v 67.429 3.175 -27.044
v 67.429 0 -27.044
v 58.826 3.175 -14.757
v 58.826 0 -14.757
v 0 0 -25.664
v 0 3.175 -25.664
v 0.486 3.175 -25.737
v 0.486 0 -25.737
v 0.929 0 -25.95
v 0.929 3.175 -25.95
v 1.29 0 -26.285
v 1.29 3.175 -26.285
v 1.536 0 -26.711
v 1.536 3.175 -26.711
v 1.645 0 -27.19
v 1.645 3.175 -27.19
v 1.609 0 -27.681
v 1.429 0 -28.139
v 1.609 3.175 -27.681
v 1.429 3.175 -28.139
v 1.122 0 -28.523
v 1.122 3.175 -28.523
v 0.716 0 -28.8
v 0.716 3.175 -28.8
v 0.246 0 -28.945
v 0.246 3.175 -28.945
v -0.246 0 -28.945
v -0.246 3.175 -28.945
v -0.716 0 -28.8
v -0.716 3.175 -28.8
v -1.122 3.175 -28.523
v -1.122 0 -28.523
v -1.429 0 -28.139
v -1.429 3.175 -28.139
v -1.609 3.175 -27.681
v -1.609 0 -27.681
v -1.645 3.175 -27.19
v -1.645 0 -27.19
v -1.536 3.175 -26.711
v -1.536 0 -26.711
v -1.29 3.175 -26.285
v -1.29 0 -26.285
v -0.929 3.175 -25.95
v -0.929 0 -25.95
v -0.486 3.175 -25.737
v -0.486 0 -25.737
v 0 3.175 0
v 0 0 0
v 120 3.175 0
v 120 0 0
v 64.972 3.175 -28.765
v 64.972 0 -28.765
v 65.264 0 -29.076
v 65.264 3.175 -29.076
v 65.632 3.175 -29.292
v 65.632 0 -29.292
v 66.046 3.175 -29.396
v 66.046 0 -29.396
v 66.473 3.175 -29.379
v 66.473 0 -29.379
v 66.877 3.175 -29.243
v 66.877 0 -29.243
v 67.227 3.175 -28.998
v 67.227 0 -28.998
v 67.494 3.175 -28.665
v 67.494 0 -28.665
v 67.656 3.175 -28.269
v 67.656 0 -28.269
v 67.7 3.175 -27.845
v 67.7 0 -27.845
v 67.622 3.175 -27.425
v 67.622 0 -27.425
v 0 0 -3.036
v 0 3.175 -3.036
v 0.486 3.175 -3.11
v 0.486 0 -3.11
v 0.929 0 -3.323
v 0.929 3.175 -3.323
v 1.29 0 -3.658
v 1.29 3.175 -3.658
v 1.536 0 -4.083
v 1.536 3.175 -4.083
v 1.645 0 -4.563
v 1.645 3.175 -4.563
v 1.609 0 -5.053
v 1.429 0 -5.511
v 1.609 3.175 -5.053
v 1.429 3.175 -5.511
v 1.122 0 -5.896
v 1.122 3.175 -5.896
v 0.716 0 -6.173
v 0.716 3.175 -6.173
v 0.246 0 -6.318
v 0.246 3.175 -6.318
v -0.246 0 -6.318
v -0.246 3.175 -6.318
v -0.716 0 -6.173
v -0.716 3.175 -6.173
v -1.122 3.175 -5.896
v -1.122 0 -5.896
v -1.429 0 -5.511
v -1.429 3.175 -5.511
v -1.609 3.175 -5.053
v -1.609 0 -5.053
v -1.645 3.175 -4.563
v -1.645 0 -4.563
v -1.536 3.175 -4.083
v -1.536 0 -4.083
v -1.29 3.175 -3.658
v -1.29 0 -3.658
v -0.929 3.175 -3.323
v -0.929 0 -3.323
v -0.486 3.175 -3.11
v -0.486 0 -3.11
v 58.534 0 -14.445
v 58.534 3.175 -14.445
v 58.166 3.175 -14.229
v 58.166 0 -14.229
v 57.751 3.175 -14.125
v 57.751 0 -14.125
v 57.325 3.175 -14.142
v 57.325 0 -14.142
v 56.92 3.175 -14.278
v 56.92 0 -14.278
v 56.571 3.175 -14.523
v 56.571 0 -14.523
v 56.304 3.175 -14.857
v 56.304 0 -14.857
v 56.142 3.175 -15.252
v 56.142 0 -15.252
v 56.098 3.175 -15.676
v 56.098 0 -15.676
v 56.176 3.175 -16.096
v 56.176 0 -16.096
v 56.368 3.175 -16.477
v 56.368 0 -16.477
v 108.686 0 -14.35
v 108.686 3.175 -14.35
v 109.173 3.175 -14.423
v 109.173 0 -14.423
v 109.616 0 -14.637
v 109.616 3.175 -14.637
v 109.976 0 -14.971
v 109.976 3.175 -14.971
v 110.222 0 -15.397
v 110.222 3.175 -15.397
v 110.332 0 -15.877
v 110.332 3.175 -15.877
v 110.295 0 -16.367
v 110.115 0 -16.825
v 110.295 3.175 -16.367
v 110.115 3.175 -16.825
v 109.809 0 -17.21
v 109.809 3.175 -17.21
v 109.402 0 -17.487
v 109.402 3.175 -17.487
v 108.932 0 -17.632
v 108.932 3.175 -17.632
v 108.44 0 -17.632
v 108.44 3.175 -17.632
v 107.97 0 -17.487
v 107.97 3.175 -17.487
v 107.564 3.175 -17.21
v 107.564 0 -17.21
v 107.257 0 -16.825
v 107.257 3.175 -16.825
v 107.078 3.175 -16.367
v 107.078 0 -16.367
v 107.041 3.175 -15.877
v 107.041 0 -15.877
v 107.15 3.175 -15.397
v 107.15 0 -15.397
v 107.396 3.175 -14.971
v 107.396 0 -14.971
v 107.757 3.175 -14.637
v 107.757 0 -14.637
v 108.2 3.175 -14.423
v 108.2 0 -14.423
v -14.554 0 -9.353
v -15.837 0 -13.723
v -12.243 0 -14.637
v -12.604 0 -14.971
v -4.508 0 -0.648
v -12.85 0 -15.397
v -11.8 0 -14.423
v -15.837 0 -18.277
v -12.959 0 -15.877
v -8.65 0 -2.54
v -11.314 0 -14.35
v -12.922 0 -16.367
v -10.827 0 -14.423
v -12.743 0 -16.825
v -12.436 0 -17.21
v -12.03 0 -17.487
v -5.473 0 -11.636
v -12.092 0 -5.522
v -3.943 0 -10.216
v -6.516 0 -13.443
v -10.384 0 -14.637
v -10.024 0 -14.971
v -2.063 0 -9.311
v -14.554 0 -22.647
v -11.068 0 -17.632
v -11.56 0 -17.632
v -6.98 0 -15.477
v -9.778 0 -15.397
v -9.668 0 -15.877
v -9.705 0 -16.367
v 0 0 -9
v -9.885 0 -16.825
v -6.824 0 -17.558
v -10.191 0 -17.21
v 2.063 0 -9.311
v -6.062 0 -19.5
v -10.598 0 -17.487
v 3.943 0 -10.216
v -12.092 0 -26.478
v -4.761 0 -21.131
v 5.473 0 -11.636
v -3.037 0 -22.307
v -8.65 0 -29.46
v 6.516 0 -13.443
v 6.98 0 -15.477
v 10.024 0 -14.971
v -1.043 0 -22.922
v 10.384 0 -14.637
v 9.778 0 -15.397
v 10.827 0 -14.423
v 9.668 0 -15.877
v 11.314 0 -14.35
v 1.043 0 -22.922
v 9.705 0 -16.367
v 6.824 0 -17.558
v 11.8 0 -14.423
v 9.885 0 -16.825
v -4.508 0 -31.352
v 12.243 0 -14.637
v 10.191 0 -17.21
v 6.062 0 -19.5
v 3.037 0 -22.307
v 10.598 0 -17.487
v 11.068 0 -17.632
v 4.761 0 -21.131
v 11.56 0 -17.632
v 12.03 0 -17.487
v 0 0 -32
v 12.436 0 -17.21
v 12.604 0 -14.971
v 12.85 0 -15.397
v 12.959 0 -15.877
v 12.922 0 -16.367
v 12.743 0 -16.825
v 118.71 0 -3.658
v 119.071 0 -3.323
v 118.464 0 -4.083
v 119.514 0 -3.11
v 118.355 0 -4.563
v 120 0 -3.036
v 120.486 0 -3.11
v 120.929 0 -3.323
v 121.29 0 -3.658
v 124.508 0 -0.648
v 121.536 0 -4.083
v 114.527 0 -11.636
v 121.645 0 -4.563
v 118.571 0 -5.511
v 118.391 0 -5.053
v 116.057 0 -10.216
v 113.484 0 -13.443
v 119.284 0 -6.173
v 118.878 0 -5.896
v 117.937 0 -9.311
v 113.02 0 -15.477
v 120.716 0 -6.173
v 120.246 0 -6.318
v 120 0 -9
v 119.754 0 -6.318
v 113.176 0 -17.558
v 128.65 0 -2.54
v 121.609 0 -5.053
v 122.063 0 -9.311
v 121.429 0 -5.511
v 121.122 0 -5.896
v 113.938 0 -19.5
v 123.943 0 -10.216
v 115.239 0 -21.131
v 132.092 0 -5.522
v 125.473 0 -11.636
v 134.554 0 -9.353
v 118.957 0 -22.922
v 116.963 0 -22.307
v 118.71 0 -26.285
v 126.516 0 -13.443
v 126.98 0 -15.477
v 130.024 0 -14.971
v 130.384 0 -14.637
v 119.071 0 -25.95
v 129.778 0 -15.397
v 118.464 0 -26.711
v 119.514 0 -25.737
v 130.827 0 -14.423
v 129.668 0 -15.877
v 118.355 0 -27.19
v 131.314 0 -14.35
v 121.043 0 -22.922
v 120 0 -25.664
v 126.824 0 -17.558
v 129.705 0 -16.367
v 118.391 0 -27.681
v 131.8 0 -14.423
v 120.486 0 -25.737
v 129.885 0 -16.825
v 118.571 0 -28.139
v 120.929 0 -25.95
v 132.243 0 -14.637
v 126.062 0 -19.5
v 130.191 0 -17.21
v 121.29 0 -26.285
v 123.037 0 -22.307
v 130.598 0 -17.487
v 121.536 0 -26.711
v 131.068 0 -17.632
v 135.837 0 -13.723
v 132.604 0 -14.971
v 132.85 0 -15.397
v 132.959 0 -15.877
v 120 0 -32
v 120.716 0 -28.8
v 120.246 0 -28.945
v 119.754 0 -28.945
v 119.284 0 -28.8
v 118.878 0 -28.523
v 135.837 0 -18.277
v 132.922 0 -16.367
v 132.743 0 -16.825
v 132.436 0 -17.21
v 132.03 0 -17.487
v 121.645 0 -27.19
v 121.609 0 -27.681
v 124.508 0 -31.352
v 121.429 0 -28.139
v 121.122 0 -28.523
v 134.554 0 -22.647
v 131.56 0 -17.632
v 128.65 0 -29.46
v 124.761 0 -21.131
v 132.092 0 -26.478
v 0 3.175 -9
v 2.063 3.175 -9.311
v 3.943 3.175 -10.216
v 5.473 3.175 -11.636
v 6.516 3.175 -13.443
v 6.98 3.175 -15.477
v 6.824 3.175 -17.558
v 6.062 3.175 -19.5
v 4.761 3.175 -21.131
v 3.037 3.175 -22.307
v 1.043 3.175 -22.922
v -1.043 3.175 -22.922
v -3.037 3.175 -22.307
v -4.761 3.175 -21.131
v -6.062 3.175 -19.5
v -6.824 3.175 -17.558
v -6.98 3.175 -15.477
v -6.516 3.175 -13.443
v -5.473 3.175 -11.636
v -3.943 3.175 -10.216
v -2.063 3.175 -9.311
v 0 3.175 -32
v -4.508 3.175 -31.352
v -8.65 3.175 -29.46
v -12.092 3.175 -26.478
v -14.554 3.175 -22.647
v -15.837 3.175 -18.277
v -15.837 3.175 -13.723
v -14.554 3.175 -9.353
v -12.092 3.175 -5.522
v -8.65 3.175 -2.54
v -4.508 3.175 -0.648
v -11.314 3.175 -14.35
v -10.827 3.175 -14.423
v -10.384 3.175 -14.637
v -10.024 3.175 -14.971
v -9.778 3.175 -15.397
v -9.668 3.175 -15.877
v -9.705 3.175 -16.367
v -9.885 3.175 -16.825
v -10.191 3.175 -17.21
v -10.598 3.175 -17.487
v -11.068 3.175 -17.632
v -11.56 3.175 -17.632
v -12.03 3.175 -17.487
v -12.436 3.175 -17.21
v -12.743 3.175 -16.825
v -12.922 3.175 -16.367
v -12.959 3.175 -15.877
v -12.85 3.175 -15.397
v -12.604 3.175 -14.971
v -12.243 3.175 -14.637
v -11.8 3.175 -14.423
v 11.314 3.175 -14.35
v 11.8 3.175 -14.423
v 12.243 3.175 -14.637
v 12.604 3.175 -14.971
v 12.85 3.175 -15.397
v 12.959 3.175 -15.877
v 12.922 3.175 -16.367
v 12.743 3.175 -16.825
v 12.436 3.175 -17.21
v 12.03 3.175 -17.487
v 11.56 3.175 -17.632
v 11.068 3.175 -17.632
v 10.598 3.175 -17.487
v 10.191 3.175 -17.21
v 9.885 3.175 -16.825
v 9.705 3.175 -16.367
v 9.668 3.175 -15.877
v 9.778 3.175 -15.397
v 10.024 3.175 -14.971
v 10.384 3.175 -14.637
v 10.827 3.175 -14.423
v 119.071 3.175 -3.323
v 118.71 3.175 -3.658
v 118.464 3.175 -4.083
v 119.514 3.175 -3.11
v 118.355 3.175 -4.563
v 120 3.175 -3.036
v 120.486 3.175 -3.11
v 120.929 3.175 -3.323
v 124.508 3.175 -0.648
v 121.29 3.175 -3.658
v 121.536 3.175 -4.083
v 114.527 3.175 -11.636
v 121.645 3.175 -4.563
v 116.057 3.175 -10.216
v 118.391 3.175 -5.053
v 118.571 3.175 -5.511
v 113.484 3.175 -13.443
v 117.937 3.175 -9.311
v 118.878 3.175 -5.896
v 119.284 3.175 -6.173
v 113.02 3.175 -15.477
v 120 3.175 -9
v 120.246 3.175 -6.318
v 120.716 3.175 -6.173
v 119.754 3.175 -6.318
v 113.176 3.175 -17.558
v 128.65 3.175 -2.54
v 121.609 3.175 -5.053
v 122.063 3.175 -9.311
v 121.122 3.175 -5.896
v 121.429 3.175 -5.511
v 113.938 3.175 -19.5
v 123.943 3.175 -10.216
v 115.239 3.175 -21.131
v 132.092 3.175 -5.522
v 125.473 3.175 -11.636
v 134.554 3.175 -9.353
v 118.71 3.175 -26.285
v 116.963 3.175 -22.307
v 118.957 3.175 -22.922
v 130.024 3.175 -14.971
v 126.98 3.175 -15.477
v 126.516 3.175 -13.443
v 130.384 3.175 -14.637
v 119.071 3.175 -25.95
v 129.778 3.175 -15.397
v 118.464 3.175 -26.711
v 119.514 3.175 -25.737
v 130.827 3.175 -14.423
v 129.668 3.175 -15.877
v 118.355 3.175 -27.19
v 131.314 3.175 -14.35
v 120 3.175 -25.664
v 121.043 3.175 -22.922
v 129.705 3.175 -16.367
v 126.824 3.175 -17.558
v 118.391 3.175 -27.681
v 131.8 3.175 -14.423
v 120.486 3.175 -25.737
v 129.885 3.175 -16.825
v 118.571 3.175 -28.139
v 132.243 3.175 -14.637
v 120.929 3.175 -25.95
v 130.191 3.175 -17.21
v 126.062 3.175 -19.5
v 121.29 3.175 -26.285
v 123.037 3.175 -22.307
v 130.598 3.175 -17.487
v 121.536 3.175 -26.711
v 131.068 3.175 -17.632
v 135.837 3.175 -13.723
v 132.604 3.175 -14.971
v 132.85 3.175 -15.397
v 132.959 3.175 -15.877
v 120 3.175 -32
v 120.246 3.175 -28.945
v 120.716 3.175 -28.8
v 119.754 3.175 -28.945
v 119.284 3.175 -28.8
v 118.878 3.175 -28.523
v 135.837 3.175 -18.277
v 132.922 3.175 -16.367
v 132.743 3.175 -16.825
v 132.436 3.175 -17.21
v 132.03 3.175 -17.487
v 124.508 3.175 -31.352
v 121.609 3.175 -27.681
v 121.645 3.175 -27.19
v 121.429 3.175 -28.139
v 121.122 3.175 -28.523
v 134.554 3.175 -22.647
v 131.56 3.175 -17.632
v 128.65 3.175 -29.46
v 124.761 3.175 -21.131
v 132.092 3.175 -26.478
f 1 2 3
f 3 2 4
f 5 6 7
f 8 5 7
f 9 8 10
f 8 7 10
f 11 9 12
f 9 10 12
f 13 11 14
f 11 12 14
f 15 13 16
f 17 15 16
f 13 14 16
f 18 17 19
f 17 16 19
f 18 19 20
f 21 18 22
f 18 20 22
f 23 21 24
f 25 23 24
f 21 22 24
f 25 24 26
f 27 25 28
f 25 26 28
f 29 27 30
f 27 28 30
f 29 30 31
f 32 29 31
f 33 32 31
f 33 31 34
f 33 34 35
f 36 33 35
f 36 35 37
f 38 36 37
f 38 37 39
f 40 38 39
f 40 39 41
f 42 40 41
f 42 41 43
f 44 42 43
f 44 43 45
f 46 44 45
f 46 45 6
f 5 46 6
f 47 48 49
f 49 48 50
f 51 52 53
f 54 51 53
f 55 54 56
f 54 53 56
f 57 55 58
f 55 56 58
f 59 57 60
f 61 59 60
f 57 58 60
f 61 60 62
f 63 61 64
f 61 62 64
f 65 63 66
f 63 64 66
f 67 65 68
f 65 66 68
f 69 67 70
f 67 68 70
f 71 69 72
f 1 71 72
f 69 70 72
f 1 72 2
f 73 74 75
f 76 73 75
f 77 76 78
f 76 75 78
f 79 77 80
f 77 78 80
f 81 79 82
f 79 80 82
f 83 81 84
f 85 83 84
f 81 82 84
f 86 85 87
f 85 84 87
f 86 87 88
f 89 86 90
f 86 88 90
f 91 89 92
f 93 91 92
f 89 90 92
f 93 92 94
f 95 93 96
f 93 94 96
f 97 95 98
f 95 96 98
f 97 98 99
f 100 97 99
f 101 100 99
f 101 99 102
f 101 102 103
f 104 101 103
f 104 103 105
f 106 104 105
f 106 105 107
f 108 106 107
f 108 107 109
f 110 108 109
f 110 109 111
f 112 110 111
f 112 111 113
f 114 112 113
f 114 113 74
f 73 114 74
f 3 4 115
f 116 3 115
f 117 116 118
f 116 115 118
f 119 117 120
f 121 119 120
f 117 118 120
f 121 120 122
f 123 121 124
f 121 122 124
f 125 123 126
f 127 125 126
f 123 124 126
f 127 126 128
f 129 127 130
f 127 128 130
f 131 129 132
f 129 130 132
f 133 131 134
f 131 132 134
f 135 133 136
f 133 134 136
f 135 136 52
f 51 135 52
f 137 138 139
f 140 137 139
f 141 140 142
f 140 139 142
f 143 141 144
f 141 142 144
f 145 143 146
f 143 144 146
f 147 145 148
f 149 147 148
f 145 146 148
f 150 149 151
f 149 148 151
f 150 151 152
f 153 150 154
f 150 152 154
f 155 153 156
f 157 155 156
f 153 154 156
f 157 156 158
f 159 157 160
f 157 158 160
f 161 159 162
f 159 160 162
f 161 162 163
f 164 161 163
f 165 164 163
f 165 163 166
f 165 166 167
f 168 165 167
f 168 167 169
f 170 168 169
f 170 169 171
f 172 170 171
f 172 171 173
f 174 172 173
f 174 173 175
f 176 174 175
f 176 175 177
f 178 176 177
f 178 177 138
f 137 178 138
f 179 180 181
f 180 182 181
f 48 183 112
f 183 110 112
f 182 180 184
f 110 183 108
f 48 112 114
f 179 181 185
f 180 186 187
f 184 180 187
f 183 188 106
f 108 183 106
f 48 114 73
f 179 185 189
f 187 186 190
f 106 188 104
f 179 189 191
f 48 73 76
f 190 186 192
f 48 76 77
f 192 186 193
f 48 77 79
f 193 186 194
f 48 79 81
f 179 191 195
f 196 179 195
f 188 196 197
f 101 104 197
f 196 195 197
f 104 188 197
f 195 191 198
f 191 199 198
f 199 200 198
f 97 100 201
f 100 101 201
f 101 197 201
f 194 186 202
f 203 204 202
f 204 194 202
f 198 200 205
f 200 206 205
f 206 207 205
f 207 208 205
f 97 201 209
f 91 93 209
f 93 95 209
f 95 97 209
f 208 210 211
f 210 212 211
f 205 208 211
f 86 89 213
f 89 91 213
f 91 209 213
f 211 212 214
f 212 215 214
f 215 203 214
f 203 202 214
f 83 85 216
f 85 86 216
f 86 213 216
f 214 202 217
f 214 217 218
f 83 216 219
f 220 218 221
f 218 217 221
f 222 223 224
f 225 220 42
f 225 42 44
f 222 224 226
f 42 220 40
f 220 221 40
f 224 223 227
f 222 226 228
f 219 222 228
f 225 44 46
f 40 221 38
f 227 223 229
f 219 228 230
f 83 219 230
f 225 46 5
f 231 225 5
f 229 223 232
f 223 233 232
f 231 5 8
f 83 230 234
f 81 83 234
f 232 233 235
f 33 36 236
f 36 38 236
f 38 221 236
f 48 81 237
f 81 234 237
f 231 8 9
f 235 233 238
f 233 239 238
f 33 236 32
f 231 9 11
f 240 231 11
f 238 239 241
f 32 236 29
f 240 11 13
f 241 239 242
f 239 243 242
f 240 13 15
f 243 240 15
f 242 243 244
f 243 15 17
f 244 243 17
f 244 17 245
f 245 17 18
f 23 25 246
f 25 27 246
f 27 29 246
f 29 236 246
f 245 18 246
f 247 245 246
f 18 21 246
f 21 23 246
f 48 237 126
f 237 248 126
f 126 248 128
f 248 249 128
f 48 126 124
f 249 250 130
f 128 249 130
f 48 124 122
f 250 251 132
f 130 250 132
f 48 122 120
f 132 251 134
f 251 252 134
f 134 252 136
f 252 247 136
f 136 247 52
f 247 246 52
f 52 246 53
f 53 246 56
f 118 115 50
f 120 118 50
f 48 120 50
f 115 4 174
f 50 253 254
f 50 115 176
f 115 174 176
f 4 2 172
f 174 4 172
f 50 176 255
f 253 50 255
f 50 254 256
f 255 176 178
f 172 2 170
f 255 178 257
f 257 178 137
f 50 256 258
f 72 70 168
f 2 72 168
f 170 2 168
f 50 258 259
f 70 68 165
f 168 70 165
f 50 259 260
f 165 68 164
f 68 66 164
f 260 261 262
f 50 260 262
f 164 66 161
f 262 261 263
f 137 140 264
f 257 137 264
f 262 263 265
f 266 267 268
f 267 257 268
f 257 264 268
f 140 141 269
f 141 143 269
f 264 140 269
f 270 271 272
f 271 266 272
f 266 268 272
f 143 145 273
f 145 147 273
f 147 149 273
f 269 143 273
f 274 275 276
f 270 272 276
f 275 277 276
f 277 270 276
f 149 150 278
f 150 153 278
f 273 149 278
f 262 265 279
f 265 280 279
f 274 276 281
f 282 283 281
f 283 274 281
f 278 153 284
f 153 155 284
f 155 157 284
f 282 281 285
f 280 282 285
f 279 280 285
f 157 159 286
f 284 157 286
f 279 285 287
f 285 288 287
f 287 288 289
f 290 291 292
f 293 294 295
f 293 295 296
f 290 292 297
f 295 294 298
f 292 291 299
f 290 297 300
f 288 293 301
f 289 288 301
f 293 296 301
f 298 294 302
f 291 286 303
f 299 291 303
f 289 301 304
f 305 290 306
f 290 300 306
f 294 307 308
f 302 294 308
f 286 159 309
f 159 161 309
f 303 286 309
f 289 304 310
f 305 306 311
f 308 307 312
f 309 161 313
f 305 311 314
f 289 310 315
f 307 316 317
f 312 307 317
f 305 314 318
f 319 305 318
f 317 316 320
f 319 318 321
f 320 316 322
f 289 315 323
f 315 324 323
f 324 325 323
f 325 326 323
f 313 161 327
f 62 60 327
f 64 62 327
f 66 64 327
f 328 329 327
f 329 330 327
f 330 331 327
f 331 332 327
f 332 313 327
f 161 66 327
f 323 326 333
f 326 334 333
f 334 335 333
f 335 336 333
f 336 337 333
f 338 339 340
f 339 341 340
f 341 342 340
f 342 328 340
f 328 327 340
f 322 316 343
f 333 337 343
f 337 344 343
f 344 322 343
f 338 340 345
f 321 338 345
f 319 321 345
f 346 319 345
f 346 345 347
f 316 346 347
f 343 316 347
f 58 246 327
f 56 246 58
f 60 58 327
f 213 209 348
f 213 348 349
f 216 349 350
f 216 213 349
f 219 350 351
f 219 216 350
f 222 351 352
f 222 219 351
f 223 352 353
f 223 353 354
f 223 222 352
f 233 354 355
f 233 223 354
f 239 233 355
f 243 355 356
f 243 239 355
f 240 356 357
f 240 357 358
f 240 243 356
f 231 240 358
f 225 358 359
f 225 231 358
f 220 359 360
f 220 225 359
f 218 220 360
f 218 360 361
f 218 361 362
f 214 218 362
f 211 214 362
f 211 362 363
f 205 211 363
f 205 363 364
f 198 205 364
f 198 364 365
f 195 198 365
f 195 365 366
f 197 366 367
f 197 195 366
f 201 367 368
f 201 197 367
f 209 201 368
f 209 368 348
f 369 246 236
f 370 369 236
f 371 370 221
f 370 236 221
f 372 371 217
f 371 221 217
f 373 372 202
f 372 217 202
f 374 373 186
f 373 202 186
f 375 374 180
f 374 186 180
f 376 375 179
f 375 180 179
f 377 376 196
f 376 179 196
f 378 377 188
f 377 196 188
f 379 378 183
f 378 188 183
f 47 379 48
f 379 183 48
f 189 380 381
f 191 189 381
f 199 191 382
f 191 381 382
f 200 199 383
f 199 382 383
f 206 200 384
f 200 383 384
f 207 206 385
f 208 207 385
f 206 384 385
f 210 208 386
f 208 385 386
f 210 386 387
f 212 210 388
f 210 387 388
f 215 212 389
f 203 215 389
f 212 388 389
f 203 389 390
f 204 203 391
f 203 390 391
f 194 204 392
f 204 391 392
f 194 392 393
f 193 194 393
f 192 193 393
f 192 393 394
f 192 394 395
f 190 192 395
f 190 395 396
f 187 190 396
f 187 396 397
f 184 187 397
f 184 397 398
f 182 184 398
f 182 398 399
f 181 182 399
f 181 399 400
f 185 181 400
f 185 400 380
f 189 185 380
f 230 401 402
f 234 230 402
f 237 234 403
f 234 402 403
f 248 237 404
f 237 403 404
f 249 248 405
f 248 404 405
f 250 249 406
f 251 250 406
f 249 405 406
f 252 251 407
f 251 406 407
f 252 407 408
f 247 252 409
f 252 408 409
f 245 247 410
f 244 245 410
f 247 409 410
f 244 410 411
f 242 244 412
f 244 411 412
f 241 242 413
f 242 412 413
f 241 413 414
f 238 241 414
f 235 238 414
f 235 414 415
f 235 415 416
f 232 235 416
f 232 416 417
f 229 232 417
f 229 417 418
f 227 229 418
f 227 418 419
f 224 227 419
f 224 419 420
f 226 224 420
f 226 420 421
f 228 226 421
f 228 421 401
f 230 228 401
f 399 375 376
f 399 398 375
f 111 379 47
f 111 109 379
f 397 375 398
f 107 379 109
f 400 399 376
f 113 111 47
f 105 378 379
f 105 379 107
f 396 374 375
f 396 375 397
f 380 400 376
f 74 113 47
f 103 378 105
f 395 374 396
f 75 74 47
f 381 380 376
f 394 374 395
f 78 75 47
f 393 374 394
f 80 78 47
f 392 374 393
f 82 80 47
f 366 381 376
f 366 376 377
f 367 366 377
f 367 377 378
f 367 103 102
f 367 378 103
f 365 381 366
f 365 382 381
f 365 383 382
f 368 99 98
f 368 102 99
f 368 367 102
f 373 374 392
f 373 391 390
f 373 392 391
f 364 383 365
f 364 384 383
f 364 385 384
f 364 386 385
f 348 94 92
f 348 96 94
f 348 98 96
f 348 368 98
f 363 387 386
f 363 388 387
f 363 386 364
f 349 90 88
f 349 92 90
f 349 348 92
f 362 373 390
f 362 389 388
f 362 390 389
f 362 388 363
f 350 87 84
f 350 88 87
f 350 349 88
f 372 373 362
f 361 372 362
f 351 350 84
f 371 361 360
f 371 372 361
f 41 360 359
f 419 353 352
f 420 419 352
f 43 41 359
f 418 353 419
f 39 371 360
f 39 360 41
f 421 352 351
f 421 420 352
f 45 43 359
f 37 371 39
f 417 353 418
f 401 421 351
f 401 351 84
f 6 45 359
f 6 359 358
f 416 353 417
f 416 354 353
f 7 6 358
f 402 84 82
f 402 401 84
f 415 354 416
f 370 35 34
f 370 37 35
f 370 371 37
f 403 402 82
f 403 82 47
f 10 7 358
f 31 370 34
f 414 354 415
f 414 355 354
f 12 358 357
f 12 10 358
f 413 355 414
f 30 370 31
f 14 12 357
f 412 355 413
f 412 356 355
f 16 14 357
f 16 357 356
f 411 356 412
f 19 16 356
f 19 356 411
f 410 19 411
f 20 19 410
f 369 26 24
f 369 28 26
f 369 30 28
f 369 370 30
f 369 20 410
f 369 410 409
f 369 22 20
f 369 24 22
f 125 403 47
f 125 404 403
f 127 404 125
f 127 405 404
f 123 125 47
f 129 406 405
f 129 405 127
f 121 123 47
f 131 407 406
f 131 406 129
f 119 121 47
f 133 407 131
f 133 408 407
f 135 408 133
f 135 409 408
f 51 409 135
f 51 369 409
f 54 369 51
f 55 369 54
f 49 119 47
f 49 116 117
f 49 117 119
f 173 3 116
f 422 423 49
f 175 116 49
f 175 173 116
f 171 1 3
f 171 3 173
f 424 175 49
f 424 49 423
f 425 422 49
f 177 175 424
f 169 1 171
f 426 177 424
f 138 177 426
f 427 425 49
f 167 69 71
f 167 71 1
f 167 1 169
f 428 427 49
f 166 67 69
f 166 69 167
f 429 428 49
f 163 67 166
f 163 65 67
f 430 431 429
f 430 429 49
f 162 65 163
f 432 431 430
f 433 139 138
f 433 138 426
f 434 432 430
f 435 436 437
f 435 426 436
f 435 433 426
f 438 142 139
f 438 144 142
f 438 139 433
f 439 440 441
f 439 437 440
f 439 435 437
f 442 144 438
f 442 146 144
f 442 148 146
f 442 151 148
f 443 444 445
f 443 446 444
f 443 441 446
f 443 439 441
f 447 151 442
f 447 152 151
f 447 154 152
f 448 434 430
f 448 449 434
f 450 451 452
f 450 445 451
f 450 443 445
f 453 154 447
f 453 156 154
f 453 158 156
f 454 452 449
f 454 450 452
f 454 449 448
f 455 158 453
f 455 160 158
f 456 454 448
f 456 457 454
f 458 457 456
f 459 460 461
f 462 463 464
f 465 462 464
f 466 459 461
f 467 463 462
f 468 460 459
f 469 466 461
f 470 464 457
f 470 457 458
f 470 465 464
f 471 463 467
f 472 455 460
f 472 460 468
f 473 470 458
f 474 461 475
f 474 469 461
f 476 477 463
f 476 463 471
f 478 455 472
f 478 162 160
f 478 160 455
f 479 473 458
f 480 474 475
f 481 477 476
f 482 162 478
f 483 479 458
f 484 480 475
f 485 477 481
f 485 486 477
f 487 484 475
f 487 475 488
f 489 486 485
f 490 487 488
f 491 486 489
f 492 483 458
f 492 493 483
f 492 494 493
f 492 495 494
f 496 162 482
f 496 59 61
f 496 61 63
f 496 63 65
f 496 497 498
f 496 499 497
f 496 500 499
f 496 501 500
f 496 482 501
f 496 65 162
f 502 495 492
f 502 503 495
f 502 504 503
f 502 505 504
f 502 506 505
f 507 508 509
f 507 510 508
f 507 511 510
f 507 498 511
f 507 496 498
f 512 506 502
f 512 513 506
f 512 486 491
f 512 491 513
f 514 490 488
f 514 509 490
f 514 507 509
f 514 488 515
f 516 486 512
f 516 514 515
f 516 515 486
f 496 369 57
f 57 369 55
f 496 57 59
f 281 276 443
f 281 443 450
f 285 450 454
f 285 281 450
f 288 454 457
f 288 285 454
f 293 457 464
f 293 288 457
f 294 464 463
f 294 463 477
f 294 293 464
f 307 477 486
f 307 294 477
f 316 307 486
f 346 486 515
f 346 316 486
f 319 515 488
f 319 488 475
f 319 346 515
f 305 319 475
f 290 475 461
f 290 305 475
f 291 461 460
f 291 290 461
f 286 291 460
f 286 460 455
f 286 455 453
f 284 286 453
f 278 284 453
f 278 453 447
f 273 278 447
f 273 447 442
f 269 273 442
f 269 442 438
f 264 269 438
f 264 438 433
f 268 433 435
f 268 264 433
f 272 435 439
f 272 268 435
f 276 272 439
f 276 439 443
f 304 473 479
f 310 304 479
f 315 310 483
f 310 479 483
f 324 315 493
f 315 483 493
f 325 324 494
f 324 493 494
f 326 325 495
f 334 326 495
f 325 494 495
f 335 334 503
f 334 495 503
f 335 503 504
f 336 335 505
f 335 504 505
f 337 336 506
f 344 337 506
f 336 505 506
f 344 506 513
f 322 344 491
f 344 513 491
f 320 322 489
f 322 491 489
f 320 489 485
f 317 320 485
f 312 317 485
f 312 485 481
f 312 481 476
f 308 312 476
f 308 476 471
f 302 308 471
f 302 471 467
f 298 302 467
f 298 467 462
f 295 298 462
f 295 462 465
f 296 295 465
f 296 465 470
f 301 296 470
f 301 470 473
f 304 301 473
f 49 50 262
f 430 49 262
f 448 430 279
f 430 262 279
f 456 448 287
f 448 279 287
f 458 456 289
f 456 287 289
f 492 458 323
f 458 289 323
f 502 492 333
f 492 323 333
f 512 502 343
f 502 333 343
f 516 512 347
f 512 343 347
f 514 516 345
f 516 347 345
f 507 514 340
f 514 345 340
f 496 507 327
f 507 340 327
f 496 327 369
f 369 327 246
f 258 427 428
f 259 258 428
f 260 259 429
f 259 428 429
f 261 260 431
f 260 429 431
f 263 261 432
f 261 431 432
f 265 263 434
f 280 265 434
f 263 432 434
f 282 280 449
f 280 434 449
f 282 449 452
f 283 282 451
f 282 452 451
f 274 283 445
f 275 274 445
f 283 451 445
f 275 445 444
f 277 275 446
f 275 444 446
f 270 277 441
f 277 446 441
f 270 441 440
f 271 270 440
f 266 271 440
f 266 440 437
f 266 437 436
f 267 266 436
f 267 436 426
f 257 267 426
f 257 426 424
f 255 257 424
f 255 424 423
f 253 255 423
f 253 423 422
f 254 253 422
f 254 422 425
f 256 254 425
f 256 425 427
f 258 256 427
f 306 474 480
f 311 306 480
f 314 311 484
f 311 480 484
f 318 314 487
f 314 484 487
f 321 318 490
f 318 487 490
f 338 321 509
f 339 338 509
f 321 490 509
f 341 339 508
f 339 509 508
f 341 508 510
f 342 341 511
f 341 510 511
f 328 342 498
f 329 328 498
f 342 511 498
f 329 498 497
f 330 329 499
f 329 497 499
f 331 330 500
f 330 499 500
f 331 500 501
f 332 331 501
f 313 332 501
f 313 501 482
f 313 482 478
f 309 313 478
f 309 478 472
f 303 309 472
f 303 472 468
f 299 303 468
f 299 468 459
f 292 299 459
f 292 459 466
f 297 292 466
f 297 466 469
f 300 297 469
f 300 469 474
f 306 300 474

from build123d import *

# Parameters (mm, degrees)
SKETCH1_R           = 7
BOSS_EXTRUDE1_DEPTH = 3.175
SKETCH2_R           = 1.65
CUT_EXTRUDE1_DEPTH  = 10


with BuildPart() as part:
    # Sketch1 → Boss-Extrude1 (new body)
    with BuildSketch(Plane(origin=(0, 0, 0), x_dir=(1, 0, 0), z_dir=(0, 1, 0))):
        with BuildLine():
            Line((0, 0), (120, 0))
            ThreePointArc((120, 0), (136, 16), (120, 32))
            Line((120, 32), (0, 32))
            ThreePointArc((0, 32), (-16, 16), (0, 0))
        make_face()
        with Locations(Location((0, 16, 0), (0, 0, 270))):
            Circle(SKETCH1_R, mode=Mode.SUBTRACT)
        with Locations(Location((120, 16, 0), (0, 0, 270))):
            Circle(SKETCH1_R, mode=Mode.SUBTRACT)
        with BuildLine():
            Line((56.368317676, 16.477323769), (64.971964222, 28.764604433))
            ThreePointArc((64.971964222, 28.764604433), (67.061056942, 29.132967845), (67.429420354, 27.043875124))
            Line((67.429420354, 27.043875124), (58.825773809, 14.75659446))
            ThreePointArc((58.825773809, 14.75659446), (56.736681088, 14.388231048), (56.368317676, 16.477323769))
        make_face(mode=Mode.SUBTRACT)
    extrude(amount=BOSS_EXTRUDE1_DEPTH)

    # Sketch2 → Cut-Extrude1 (cut)
    with BuildSketch(Plane(origin=(0, 3.175, 0), x_dir=(1, 0, 0), z_dir=(0, 1, 0))):
        with Locations(Location((120, 27.313708499, 0), (0, 0, 270))):
            Circle(SKETCH2_R)
        with Locations(Location((108.686291501, 16, 0), (0, 0, 270))):
            Circle(SKETCH2_R)
        with Locations(Location((120, 4.686291501, 0), (0, 0, 270))):
            Circle(SKETCH2_R)
        with Locations(Location((131.313708499, 16, 0), (0, 0, 270))):
            Circle(SKETCH2_R)
        with Locations(Location((-11.313708499, 16, 0), (0, 0, 270))):
            Circle(SKETCH2_R)
        with Locations(Location((0, 27.313708499, 0), (0, 0, 270))):
            Circle(SKETCH2_R)
        with Locations(Location((11.313708499, 16, 0), (0, 0, 270))):
            Circle(SKETCH2_R)
        with Locations(Location((0, 4.686291501, 0), (0, 0, 270))):
            Circle(SKETCH2_R)
    extrude(amount=-CUT_EXTRUDE1_DEPTH, mode=Mode.SUBTRACT)


solid = part.part
